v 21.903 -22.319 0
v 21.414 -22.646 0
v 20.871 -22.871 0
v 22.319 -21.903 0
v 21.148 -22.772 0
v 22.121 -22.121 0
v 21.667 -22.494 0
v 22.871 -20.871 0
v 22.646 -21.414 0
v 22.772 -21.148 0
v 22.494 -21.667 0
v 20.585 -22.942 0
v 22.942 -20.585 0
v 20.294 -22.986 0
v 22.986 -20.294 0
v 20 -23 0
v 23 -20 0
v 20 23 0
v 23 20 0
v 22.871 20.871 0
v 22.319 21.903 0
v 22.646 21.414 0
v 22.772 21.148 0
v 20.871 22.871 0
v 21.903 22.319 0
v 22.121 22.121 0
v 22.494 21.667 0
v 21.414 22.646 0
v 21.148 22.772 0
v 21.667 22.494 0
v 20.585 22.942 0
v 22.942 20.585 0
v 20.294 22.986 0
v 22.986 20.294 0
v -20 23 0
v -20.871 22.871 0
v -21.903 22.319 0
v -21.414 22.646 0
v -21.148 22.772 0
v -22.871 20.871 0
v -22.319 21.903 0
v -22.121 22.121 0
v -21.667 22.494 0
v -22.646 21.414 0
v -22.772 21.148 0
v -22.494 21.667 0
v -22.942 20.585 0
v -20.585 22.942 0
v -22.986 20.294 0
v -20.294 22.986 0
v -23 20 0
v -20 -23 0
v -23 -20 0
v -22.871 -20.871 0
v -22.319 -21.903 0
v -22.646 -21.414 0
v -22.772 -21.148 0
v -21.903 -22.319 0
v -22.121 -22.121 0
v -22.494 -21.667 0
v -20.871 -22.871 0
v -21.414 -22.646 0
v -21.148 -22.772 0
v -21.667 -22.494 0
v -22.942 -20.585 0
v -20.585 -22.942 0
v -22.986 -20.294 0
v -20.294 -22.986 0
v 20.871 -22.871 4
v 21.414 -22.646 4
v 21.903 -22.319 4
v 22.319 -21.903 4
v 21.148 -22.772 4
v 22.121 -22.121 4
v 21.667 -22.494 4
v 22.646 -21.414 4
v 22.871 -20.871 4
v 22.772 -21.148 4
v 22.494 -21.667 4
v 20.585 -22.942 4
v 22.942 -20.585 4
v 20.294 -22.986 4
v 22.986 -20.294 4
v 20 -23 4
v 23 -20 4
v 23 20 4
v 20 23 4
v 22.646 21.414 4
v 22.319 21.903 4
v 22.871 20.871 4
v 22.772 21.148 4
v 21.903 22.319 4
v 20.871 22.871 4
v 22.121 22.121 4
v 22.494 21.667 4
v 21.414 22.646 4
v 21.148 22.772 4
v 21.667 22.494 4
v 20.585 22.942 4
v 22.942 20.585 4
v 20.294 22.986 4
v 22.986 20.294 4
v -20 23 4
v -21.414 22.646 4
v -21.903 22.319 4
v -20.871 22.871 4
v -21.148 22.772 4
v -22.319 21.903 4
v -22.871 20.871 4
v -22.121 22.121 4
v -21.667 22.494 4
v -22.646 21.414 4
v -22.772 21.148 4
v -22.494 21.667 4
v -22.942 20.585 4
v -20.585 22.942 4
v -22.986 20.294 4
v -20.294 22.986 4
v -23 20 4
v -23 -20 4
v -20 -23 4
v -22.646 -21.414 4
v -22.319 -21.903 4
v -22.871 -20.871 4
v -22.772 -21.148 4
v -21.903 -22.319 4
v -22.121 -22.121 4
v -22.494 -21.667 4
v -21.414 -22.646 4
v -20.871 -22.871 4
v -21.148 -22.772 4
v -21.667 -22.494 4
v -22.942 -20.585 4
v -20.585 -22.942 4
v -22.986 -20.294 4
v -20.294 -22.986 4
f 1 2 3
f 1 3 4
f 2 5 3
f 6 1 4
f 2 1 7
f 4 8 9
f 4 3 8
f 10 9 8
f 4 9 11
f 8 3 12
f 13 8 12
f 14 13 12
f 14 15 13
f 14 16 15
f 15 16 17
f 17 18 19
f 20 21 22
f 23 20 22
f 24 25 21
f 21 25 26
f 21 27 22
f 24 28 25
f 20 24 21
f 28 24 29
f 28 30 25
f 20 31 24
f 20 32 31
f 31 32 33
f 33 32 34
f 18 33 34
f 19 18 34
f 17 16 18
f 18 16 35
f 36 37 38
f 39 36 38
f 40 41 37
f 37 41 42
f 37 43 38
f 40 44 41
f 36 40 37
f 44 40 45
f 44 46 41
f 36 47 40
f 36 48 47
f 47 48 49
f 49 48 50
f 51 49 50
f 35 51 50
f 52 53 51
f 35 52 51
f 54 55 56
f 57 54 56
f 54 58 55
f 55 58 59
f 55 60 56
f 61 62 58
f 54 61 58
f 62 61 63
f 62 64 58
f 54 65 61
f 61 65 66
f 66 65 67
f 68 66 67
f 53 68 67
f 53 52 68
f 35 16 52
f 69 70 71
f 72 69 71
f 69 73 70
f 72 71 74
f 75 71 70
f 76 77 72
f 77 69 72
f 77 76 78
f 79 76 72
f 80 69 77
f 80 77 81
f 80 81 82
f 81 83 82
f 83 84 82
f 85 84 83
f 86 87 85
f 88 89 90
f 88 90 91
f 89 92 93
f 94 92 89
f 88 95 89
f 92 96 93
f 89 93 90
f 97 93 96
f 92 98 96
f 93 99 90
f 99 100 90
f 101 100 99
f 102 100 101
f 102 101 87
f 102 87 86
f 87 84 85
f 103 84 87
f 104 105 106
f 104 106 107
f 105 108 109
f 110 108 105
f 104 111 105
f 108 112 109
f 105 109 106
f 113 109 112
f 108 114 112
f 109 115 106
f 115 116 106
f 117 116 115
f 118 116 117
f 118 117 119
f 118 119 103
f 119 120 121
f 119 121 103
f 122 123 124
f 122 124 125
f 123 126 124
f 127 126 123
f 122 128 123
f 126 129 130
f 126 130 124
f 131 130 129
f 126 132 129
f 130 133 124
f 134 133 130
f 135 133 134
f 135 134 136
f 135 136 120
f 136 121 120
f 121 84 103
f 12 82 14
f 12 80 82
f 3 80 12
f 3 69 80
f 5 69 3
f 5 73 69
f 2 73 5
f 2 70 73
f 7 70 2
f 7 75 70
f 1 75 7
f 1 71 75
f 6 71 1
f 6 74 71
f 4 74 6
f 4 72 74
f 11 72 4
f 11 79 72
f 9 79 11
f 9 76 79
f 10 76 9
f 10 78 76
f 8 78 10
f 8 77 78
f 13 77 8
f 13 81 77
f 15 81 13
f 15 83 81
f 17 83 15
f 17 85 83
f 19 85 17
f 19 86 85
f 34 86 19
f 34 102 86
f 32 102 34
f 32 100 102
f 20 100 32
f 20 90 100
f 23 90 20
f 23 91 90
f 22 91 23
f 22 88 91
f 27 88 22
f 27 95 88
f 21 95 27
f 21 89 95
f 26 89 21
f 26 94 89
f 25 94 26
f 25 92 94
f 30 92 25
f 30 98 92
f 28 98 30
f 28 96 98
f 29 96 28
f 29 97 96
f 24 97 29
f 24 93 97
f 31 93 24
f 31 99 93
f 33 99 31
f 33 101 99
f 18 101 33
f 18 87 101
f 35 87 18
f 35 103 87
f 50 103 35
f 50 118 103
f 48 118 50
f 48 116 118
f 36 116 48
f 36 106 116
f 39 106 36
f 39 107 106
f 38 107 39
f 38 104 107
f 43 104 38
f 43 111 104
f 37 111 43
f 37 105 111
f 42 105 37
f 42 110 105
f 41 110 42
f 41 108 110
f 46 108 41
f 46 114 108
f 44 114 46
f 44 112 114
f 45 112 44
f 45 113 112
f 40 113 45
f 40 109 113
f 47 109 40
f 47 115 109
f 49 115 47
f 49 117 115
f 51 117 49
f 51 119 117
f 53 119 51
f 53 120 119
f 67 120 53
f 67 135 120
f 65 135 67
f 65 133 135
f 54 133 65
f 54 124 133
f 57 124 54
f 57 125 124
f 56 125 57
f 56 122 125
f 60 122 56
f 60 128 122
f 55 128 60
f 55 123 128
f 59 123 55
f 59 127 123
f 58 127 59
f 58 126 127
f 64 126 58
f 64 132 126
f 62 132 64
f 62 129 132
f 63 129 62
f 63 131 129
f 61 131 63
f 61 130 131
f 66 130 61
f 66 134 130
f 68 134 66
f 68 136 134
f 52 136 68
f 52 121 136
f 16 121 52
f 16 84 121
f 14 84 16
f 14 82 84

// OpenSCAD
// Carimbo com logo — modelo próprio do Multiferramenta 3D
// Partes: "carimbo" (placa + desenho ESPELHADO em relevo) e "cabo" (cole atrás da placa)
logo = []; lw = 40; lh = 40;
esp = 4; relevo = 2.5; margem = 3; cabo_d = 22; cabo_alt = 28;
parte = "carimbo";
$fn = 64;

module desenho() mirror([1, 0]) for (p = logo) polygon(points = p[0], paths = p[1]);
if (parte == "carimbo") {
  linear_extrude(esp) offset(r = margem) square([lw, lh], center = true);
  translate([0, 0, esp]) linear_extrude(relevo) desenho();
}
else if (parte == "cabo") {
  cylinder(d1 = min(lw, lh, 30), d2 = cabo_d * 0.7, h = cabo_alt * 0.55);
  translate([0, 0, cabo_alt * 0.55]) cylinder(d1 = cabo_d * 0.7, d2 = cabo_d, h = cabo_alt * 0.25);
  translate([0, 0, cabo_alt * 0.8]) resize([cabo_d, cabo_d, cabo_alt * 0.4]) sphere(d = cabo_d);
}
